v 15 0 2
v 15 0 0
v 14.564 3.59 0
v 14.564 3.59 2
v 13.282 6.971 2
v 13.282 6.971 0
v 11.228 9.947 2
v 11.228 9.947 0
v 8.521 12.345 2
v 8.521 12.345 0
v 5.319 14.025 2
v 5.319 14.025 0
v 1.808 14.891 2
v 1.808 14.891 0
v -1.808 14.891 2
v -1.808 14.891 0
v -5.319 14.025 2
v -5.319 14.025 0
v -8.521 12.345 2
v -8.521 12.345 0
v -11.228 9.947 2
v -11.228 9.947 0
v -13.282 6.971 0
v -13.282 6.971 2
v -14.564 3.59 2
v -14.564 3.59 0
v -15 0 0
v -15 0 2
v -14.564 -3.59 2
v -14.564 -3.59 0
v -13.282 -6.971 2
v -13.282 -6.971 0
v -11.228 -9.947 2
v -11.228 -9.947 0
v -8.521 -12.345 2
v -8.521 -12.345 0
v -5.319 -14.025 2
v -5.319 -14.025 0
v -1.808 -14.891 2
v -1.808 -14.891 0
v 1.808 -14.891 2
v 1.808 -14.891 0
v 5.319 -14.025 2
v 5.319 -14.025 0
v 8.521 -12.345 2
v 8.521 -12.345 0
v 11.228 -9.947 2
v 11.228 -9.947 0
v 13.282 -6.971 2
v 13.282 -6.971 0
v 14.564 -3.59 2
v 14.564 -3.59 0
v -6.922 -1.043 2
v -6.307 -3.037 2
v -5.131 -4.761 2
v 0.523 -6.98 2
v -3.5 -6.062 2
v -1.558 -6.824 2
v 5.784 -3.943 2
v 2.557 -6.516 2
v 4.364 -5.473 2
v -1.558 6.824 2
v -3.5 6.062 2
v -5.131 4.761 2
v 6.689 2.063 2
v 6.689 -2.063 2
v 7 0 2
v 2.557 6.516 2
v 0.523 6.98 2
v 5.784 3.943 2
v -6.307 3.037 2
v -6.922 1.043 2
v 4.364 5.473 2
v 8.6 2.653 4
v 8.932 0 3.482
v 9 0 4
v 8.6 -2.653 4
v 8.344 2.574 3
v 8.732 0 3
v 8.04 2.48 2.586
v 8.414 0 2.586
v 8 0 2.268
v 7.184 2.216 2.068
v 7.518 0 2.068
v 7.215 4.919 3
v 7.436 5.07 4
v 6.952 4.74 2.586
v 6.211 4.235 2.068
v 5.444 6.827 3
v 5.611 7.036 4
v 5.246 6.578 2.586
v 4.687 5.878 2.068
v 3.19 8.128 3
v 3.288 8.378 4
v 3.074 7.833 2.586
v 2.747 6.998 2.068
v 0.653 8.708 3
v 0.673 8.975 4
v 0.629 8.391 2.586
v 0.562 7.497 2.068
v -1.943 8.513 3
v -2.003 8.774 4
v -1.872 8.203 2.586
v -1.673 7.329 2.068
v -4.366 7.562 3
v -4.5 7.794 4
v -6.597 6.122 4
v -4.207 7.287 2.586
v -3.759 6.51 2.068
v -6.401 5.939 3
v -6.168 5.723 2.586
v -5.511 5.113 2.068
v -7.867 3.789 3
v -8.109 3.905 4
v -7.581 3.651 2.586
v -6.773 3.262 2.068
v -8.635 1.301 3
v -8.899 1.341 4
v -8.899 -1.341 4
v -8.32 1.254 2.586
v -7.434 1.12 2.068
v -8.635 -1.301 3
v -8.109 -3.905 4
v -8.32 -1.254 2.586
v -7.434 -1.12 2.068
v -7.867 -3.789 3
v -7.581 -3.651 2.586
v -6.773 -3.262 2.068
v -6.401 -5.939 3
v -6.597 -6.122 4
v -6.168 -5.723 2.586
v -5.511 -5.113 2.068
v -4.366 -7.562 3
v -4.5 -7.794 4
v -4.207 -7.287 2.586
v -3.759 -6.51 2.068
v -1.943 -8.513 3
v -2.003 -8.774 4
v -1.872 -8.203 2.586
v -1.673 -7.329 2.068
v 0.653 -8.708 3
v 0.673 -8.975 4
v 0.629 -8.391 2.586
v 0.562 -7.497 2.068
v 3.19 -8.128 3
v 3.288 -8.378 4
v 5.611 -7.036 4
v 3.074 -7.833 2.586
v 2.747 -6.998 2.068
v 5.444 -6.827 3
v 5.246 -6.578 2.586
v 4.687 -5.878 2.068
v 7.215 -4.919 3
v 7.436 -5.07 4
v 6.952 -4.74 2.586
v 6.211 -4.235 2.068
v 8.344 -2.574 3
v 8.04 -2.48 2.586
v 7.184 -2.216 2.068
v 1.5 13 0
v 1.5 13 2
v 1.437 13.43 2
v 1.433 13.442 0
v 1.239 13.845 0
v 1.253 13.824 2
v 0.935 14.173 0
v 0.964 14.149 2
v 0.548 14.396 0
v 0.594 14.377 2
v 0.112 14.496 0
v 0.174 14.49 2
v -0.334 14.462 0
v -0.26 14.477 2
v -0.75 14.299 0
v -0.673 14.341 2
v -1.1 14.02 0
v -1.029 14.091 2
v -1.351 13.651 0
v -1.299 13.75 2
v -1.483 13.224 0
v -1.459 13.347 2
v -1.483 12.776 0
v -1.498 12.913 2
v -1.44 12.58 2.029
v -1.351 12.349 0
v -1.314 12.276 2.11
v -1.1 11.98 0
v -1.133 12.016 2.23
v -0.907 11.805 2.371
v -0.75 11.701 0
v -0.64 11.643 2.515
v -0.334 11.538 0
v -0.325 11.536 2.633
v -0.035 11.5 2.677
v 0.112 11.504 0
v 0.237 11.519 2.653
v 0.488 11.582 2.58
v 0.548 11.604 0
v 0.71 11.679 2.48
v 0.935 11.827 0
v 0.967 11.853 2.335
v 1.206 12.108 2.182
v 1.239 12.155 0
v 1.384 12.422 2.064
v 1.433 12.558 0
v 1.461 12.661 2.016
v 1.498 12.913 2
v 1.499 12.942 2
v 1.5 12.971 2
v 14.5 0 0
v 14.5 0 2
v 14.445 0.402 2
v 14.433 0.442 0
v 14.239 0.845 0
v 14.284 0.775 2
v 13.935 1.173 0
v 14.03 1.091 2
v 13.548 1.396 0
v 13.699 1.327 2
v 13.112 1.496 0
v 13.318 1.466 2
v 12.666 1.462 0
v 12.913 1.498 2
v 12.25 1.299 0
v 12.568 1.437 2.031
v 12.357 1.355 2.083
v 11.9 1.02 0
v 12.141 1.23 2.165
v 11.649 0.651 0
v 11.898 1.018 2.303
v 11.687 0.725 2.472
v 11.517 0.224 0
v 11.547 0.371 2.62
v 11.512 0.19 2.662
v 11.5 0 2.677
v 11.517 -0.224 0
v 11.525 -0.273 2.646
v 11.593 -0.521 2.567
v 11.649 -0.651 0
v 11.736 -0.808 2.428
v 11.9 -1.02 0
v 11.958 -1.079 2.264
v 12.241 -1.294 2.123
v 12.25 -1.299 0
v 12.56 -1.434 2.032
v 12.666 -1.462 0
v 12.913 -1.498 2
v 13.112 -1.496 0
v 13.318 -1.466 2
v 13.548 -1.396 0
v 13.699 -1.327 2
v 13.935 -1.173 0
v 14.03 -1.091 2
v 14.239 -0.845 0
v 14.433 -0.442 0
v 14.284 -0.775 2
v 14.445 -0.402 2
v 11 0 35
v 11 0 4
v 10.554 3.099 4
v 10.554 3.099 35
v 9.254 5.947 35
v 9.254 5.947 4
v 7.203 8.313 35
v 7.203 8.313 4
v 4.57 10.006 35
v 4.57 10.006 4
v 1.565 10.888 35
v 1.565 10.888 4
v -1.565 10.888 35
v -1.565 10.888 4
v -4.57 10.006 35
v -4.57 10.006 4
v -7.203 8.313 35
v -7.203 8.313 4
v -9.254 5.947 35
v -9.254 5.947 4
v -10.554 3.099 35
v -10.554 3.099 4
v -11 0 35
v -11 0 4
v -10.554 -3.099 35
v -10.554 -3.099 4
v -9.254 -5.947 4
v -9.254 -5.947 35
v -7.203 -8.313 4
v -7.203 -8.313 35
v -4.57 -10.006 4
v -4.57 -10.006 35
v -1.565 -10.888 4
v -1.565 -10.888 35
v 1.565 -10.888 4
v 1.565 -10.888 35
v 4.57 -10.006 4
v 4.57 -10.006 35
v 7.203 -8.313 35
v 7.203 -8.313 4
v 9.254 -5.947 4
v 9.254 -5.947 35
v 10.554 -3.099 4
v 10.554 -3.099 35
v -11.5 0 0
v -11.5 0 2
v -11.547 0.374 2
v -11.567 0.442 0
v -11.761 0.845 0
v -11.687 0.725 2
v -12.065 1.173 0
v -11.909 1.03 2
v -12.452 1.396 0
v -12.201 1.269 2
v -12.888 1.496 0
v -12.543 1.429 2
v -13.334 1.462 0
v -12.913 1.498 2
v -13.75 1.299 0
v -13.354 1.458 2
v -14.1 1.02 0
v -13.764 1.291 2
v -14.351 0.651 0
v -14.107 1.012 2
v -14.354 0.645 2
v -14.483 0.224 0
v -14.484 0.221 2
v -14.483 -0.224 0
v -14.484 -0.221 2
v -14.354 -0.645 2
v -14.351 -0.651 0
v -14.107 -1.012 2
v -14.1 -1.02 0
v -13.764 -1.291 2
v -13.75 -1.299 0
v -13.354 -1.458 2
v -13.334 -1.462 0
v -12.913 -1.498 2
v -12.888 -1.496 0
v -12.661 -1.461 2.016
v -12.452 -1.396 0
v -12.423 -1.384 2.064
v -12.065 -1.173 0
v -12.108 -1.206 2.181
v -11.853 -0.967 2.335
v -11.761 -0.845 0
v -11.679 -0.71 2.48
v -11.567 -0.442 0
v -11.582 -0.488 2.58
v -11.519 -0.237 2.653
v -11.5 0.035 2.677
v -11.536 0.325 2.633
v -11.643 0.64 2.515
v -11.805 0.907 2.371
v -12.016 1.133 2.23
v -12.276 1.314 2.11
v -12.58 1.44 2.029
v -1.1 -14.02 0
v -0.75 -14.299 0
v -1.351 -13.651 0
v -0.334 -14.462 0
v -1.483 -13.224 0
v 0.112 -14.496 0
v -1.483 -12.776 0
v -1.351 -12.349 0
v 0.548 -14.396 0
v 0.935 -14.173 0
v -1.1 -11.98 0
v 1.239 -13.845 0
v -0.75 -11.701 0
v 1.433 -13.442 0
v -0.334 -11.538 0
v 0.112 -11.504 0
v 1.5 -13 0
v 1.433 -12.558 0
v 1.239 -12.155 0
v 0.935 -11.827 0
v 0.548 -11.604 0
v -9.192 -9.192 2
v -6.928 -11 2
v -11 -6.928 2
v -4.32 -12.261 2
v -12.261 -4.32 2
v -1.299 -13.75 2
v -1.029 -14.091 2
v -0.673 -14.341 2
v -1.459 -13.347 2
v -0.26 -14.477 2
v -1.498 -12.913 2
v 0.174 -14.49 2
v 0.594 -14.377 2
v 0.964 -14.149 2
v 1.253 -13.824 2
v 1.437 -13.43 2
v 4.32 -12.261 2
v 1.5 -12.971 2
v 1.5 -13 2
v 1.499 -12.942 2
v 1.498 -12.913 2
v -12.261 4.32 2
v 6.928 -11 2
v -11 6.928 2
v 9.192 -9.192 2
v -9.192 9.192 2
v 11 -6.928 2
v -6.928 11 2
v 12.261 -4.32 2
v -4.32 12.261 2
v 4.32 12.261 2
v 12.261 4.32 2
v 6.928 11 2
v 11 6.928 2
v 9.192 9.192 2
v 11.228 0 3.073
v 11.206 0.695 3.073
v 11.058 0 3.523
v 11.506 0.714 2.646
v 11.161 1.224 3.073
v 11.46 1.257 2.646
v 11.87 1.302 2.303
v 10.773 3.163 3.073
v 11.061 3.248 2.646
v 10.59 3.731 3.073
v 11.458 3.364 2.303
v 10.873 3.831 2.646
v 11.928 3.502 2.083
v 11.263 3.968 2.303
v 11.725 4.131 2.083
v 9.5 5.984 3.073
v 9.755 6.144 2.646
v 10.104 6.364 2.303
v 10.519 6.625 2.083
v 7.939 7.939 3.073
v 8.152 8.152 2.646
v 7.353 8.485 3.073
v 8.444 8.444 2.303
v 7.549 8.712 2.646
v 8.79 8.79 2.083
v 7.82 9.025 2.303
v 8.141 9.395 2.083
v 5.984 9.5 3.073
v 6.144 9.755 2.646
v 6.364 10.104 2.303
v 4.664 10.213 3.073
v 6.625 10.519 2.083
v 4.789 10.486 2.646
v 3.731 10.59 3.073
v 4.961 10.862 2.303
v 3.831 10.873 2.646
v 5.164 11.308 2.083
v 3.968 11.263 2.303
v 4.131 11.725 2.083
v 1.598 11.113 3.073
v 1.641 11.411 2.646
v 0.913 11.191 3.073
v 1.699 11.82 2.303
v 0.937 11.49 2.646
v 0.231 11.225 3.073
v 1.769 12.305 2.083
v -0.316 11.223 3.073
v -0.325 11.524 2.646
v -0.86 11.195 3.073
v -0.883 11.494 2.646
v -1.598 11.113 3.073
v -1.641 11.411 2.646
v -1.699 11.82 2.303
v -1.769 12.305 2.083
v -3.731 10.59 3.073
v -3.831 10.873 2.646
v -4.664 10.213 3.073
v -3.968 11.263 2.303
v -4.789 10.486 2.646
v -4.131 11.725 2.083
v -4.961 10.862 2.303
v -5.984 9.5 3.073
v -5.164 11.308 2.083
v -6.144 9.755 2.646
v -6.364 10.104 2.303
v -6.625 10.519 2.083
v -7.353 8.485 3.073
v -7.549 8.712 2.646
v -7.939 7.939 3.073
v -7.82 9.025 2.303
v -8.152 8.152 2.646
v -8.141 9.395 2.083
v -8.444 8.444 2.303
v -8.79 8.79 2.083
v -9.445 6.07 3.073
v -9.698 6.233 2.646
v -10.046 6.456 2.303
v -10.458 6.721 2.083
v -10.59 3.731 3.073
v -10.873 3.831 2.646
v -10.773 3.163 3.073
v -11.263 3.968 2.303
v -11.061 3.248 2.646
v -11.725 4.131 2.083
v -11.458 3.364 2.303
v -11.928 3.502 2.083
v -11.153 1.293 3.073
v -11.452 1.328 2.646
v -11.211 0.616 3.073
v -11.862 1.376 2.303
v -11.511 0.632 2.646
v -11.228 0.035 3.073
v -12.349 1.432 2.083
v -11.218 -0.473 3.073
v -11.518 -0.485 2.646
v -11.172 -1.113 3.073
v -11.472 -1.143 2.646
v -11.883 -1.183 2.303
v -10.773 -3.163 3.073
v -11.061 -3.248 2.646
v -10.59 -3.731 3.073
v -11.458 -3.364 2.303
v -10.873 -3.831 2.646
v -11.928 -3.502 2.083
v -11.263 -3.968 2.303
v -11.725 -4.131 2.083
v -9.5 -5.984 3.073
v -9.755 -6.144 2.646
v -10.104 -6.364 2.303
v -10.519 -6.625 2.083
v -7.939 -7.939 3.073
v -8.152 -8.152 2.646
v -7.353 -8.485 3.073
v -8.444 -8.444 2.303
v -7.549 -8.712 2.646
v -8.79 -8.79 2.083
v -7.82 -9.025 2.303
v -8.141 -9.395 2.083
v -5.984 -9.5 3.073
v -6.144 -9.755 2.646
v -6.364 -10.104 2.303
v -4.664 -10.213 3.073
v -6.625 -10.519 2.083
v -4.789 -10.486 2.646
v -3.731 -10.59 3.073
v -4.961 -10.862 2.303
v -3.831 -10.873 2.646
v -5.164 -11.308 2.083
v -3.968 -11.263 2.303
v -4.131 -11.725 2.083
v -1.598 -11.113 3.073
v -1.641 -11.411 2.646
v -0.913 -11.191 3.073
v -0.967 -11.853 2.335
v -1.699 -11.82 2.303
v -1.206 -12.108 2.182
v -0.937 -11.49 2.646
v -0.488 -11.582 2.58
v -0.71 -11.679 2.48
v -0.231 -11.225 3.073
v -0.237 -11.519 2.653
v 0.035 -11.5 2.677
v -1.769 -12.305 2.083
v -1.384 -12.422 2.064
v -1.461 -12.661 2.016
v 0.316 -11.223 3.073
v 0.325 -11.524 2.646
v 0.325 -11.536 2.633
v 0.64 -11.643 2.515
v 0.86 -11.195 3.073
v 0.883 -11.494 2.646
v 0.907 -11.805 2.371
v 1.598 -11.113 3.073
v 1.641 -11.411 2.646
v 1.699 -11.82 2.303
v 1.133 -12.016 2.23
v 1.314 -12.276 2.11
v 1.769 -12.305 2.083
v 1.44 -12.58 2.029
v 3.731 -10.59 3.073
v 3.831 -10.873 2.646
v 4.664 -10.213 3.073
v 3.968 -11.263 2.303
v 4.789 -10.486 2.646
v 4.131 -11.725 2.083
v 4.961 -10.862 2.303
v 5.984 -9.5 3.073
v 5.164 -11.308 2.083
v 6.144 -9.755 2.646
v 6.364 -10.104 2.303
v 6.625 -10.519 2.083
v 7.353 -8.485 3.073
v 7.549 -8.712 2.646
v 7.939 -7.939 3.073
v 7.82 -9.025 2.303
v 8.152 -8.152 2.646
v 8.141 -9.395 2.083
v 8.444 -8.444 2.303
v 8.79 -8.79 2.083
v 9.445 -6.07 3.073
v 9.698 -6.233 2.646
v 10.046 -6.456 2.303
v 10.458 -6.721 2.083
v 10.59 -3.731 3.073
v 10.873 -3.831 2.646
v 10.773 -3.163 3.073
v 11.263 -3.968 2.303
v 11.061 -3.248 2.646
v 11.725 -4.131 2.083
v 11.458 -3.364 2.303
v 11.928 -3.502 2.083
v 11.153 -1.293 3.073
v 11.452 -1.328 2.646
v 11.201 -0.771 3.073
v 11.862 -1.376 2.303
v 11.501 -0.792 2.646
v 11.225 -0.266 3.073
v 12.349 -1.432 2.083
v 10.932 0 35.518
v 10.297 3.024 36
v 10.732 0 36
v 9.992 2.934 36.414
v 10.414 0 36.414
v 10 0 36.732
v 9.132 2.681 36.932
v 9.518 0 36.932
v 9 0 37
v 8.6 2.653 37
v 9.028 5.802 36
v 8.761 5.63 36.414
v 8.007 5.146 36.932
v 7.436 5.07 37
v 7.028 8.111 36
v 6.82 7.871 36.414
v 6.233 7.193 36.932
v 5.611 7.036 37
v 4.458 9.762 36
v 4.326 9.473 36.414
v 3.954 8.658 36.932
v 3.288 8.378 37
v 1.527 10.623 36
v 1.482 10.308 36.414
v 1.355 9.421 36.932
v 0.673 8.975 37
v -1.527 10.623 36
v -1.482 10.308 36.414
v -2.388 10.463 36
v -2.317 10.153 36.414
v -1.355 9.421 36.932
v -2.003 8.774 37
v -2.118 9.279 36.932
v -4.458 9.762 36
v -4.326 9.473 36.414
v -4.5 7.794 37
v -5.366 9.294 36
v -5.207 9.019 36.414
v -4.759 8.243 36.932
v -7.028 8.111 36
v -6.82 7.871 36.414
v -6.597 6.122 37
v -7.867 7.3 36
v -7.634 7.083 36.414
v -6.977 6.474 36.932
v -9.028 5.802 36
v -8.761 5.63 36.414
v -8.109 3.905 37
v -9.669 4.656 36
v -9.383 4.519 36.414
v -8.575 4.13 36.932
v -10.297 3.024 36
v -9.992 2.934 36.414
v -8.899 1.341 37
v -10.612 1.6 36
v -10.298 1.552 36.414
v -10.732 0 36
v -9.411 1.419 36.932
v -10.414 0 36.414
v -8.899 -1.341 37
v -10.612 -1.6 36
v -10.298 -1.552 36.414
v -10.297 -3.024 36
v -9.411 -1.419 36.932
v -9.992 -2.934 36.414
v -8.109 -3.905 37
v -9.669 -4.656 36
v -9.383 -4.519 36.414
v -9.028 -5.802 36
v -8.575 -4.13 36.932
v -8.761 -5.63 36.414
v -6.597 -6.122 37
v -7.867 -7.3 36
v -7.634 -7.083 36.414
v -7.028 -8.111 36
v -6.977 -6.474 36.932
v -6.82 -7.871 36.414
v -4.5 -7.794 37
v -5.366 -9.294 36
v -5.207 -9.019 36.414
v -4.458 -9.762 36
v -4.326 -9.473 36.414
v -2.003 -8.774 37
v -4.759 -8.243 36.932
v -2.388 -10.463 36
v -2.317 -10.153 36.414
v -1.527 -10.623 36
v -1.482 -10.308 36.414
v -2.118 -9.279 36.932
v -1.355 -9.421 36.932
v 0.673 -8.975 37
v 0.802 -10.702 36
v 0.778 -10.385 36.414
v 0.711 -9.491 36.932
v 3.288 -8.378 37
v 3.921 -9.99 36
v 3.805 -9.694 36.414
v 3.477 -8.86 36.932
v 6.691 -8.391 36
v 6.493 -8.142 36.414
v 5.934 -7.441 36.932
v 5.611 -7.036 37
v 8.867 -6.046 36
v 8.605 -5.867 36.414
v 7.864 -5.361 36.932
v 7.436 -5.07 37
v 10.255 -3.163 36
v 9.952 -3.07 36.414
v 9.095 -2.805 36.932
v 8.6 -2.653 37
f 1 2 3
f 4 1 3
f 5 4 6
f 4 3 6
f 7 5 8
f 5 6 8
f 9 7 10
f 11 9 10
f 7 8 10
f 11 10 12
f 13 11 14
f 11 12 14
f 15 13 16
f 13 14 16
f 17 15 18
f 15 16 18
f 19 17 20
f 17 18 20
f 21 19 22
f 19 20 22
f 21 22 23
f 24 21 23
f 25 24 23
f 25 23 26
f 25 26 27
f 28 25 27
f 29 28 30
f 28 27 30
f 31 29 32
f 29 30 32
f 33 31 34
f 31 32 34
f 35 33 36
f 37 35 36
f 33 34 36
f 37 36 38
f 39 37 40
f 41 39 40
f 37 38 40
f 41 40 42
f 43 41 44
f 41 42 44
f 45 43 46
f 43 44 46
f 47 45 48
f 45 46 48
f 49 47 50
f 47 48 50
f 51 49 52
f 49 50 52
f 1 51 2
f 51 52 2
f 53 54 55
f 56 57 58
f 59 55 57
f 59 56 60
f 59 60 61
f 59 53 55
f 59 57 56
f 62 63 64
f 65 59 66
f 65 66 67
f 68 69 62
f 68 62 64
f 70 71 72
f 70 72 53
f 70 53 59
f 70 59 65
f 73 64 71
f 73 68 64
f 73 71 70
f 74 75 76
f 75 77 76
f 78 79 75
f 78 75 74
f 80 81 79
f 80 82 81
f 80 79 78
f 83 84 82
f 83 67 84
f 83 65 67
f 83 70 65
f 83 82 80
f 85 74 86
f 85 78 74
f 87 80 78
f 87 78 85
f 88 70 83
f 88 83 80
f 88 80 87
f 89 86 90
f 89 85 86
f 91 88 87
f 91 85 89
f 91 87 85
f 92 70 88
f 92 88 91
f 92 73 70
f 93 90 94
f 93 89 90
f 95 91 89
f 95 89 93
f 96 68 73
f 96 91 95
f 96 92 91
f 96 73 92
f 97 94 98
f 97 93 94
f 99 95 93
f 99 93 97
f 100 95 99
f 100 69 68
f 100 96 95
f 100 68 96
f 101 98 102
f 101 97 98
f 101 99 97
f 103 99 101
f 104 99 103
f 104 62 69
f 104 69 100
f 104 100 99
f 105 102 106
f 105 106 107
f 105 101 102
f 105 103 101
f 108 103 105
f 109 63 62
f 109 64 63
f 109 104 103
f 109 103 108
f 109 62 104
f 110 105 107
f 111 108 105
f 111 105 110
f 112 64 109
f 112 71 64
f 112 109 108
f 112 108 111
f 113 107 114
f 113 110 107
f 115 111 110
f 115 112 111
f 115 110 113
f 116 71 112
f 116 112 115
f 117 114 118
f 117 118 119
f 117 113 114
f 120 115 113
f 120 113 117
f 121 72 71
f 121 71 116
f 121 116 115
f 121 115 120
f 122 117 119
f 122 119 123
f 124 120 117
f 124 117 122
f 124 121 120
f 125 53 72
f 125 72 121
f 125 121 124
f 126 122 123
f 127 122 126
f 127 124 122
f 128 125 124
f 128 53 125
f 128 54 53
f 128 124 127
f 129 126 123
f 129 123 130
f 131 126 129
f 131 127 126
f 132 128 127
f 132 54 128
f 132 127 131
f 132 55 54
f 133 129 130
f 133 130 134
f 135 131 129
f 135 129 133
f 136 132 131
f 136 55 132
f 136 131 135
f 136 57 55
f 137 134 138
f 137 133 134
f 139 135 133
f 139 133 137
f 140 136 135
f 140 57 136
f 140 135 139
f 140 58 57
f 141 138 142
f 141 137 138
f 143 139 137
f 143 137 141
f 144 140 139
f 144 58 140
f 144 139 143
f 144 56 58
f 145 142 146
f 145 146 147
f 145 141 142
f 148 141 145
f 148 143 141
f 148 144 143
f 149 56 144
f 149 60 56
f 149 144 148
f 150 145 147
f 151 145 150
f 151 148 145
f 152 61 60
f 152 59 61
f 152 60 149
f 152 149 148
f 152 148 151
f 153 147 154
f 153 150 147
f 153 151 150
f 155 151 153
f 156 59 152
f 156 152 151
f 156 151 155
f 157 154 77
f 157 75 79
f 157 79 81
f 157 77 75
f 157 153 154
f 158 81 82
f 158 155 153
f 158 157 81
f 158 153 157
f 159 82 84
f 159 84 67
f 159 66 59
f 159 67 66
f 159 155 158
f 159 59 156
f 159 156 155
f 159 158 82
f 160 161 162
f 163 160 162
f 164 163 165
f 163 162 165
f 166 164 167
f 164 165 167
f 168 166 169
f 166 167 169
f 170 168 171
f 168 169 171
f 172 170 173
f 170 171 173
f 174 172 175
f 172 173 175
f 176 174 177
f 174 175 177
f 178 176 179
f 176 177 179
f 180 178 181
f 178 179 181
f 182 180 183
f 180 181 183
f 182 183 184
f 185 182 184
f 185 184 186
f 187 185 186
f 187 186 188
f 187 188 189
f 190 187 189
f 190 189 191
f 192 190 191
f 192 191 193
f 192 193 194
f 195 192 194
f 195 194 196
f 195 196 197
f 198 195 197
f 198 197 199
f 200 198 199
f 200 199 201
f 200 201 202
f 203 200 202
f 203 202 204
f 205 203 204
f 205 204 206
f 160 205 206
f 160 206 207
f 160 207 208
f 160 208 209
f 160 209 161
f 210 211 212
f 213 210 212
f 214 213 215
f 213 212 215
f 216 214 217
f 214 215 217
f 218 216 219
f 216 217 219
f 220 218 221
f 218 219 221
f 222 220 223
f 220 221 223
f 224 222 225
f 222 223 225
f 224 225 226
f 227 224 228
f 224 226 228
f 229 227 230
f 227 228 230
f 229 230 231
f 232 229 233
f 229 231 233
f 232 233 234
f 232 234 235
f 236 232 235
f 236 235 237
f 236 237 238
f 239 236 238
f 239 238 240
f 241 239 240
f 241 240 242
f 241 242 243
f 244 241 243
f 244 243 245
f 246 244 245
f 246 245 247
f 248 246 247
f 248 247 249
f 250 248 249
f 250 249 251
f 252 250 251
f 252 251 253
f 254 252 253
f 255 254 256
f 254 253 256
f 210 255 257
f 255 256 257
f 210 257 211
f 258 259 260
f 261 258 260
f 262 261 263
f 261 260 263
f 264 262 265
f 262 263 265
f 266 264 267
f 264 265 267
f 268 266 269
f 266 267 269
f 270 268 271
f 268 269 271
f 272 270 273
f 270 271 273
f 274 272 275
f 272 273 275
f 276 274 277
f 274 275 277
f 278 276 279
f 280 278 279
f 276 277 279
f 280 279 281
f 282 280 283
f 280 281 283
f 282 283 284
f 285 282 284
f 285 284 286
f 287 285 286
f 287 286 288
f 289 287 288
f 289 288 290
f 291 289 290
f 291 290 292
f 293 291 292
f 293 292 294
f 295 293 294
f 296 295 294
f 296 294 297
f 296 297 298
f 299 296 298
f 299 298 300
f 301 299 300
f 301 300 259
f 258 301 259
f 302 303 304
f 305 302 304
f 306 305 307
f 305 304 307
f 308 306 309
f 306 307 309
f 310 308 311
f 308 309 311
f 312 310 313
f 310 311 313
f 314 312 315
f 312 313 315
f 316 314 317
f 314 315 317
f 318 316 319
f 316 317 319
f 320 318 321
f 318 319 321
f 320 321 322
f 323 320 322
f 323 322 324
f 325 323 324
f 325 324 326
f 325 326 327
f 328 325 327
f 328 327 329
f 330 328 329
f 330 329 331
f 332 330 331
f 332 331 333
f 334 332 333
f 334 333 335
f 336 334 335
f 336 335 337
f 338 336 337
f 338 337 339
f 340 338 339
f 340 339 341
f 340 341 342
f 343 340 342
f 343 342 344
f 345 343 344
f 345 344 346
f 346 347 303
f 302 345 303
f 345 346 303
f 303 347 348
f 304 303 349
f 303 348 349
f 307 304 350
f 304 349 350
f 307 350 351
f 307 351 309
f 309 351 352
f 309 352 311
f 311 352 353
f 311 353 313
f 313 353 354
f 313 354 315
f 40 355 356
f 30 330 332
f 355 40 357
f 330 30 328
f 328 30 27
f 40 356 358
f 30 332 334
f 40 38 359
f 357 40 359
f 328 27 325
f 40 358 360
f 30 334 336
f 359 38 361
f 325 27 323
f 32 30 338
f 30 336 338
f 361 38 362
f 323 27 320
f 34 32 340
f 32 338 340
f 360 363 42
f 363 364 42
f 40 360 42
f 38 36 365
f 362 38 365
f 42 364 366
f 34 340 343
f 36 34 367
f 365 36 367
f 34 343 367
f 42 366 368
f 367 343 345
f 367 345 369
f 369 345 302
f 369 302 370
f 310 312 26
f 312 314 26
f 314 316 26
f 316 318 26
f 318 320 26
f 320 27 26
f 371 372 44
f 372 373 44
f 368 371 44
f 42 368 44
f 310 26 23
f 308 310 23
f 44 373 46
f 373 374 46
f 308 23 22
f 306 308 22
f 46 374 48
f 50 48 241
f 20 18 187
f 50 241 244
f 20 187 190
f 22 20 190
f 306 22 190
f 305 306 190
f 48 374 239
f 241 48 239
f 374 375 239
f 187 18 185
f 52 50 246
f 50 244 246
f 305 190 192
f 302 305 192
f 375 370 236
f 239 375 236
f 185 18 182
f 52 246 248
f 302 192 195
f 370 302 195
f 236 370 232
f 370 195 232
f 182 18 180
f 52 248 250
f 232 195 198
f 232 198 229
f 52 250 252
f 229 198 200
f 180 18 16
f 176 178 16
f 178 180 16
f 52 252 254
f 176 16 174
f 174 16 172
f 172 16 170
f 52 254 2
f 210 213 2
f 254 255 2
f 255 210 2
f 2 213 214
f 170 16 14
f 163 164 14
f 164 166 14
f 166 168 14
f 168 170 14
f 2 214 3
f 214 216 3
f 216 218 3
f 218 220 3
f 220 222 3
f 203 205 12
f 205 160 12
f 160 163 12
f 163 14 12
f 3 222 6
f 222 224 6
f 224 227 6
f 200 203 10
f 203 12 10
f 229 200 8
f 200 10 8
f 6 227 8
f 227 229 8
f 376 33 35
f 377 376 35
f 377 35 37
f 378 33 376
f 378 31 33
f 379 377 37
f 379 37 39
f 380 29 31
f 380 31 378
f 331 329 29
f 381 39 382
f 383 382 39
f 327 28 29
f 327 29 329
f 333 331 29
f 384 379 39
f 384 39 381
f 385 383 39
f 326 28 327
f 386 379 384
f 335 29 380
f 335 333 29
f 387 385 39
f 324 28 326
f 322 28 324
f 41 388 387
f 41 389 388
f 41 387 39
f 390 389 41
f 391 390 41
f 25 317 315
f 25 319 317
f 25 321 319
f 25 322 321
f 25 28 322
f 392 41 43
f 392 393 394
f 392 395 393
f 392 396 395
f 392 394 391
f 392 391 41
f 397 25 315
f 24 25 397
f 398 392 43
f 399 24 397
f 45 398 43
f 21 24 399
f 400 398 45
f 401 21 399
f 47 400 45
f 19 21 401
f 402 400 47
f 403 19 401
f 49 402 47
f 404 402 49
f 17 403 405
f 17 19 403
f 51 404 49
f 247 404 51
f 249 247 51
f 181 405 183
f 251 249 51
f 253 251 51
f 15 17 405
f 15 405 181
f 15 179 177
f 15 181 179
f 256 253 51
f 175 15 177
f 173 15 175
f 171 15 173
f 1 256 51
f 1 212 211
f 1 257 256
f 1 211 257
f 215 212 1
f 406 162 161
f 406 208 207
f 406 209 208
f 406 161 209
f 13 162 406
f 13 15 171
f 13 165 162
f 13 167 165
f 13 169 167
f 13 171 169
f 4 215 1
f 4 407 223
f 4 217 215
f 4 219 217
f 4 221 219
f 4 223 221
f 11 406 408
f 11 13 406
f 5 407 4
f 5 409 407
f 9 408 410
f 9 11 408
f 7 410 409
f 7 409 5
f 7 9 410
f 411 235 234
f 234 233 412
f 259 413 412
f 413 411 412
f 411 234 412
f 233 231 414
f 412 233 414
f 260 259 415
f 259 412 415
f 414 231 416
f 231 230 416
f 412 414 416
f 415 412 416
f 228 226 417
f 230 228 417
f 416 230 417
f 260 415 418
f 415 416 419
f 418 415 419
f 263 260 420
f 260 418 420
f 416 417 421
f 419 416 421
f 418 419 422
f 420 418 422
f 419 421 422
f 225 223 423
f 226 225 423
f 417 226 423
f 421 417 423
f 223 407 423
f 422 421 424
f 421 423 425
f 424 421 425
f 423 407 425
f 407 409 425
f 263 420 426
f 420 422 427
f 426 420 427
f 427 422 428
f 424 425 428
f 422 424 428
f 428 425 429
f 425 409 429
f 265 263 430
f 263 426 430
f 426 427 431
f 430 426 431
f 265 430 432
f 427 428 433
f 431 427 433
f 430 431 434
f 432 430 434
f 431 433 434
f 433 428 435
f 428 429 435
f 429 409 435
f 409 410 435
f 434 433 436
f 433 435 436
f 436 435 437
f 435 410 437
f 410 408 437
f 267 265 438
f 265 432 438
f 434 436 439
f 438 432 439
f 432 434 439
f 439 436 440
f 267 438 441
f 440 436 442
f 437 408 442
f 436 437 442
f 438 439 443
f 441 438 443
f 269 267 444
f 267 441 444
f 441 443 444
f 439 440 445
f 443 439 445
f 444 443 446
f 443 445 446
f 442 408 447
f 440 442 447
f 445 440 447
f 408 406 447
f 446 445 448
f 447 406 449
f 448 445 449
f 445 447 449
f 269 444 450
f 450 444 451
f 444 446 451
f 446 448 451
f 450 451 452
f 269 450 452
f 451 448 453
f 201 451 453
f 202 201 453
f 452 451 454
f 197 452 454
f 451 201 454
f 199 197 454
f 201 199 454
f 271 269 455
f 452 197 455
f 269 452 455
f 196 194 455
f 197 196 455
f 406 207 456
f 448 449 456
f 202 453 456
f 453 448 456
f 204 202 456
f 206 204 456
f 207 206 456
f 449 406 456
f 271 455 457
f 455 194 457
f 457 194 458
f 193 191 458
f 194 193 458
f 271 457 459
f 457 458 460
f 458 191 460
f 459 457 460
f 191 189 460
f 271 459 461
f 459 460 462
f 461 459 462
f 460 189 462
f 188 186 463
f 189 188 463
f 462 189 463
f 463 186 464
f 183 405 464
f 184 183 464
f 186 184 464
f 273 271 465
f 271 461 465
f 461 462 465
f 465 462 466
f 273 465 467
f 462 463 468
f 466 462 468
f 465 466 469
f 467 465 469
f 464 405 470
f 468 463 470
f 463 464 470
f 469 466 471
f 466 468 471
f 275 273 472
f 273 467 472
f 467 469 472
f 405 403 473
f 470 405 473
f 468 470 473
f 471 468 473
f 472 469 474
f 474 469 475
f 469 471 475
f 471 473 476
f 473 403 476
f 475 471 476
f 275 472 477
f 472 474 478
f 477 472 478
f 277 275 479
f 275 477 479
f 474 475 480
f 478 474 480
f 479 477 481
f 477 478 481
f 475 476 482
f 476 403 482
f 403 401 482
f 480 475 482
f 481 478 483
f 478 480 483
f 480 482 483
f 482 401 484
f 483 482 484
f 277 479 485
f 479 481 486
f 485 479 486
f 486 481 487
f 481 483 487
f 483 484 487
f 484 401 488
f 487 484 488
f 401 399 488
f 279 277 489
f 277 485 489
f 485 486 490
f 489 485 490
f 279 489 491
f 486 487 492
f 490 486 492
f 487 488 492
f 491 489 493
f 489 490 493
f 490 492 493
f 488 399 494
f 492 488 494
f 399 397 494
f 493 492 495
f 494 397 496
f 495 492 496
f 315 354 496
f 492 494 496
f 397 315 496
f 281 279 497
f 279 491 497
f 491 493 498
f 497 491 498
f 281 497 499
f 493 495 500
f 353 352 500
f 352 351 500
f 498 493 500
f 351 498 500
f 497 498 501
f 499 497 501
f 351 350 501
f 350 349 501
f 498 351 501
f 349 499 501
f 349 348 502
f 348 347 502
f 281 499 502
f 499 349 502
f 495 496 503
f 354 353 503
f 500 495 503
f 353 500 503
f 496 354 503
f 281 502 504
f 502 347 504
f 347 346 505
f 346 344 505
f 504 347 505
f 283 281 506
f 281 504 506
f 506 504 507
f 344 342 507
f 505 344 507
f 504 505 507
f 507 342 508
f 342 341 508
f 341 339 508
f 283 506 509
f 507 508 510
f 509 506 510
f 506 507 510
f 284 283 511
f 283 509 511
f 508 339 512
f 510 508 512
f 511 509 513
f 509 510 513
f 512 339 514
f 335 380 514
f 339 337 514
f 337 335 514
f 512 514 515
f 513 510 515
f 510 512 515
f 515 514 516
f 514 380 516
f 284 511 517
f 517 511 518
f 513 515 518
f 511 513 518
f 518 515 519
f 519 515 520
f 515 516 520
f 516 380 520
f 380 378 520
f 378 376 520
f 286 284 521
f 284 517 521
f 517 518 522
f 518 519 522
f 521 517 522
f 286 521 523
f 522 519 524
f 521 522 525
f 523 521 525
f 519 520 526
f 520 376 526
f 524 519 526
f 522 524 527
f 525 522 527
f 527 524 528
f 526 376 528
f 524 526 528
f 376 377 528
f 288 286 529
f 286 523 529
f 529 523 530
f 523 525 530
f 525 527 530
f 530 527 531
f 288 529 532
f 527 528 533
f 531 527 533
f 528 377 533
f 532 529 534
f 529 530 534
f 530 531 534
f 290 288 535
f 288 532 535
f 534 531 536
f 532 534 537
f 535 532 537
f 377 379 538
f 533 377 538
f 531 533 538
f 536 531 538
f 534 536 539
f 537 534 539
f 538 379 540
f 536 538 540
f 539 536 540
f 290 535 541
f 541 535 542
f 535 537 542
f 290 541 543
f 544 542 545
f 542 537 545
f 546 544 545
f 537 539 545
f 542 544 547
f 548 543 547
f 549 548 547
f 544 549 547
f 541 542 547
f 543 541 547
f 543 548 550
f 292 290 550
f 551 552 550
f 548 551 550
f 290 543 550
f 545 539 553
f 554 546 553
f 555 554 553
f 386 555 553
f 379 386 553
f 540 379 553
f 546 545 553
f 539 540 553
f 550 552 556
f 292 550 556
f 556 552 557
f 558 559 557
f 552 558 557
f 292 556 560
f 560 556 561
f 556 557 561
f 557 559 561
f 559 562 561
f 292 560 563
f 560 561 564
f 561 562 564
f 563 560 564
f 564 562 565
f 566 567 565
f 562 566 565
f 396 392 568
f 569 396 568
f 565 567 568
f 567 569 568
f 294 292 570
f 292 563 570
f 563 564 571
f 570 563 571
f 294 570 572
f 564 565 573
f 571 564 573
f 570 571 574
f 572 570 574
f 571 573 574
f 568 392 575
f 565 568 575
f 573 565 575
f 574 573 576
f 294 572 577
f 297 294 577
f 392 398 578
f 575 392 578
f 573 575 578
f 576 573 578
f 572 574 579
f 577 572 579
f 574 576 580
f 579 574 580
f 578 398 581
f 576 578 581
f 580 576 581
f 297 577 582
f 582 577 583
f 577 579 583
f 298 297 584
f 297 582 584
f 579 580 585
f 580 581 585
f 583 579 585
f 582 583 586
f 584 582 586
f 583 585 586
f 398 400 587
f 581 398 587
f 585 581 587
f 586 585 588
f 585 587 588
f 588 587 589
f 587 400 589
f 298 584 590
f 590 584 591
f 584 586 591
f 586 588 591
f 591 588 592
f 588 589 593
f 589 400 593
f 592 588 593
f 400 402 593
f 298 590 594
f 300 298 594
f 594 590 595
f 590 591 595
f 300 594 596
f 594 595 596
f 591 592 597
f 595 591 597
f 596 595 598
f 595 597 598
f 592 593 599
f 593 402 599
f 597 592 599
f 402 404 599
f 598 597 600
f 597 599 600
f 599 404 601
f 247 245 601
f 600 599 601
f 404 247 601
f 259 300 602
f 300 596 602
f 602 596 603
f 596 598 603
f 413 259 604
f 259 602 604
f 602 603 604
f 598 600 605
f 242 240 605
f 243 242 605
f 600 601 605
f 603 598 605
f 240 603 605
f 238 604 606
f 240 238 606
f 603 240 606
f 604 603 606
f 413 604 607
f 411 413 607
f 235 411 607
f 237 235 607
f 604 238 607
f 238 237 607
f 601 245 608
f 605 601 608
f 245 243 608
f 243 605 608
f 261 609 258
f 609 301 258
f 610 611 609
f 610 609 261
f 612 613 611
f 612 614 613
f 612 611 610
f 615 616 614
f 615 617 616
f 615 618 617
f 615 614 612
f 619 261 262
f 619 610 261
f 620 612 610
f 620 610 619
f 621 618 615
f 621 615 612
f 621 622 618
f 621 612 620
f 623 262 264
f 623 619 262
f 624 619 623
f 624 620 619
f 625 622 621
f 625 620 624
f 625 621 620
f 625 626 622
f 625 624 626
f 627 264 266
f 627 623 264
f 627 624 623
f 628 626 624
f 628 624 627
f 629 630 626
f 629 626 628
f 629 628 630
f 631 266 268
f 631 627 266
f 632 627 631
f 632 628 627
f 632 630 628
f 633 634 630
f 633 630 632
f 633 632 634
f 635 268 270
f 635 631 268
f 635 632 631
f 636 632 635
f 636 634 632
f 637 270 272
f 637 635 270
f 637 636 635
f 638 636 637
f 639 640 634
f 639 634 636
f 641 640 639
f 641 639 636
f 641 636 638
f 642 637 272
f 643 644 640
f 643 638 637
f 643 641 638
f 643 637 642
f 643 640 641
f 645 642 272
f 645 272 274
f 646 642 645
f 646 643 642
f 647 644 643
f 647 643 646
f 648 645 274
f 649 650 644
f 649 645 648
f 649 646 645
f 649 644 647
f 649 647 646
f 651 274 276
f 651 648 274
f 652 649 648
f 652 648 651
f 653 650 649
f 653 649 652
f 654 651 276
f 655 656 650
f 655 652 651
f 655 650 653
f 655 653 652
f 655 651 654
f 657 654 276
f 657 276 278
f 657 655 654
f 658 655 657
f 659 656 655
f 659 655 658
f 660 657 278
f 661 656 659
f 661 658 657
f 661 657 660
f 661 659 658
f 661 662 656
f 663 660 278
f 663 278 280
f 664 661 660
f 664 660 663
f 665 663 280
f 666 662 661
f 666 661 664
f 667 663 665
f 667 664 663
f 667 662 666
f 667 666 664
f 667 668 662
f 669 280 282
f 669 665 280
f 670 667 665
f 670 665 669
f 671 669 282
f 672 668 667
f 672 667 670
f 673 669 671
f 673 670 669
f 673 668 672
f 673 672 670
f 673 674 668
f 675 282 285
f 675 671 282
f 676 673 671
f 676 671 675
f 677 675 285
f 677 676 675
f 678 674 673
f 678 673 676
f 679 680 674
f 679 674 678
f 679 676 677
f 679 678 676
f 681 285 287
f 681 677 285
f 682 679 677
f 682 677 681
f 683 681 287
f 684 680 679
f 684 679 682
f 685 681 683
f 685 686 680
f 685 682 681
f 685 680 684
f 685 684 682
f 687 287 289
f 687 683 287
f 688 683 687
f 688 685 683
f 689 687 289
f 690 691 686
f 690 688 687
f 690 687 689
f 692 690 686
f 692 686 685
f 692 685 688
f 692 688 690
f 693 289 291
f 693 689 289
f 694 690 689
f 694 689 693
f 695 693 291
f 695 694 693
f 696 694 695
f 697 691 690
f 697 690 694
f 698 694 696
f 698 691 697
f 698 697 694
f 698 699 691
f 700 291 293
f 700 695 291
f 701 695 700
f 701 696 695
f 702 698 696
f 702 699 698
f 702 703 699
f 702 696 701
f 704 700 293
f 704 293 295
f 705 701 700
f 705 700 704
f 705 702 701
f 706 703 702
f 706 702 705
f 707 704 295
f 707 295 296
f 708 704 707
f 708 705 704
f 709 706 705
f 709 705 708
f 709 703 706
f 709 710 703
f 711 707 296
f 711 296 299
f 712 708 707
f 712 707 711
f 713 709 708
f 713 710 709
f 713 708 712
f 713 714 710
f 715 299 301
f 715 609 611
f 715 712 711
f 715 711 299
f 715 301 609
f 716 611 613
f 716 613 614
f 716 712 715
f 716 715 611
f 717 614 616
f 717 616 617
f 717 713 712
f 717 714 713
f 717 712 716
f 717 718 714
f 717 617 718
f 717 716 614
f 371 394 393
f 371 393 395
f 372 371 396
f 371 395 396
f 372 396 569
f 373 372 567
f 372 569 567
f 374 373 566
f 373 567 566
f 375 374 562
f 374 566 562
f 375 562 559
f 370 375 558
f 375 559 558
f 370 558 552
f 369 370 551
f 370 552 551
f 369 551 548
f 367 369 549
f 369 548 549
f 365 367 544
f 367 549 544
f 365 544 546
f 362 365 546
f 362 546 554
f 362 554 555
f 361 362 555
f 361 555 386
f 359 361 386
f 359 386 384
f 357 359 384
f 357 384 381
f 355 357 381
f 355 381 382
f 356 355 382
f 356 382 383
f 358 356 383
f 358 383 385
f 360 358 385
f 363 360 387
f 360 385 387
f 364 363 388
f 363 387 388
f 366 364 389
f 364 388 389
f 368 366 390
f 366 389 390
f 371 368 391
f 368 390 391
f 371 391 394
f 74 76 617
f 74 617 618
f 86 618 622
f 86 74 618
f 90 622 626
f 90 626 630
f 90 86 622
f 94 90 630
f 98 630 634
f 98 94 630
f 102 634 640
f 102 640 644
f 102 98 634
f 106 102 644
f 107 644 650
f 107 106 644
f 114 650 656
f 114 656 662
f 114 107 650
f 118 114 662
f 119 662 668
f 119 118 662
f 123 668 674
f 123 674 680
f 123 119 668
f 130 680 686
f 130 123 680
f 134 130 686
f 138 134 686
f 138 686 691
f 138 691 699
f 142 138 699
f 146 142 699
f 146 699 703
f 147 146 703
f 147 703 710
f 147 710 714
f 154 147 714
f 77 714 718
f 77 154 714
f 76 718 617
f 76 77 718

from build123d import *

# Parameters (mm, degrees)
SKETCH1_R           = 15
BOSS_EXTRUDE1_DEPTH = 2
SKETCH2_R           = 11
SKETCH2_R_2         = 9
BOSS_EXTRUDE2_DEPTH = 35
SKETCH3_R           = 1.5
CUT_EXTRUDE1_DEPTH  = 41.926763859
FILLET1_R           = 2
FILLET2_R           = 2


with BuildPart() as part:
    # Sketch1 → Boss-Extrude1 (new body)
    with BuildSketch(Plane.XY):
        Circle(SKETCH1_R)
    extrude(amount=BOSS_EXTRUDE1_DEPTH)

    # Sketch2 → Boss-Extrude2 (add)
    with BuildSketch(Plane.XY.offset(2)):
        Circle(SKETCH2_R)
        Circle(SKETCH2_R_2, mode=Mode.SUBTRACT)
    extrude(amount=BOSS_EXTRUDE2_DEPTH)

    # Sketch3 → Cut-Extrude1 (cut, through all)
    with BuildSketch(Plane.XY.offset(2)):
        with Locations((0, 13)):
            Circle(SKETCH3_R)
        with Locations((13, 0)):
            Circle(SKETCH3_R)
        with Locations((0, -13)):
            Circle(SKETCH3_R)
        with Locations((-13, 0)):
            Circle(SKETCH3_R)
    extrude(amount=-CUT_EXTRUDE1_DEPTH, mode=Mode.SUBTRACT)

    # Fillet1
    # the kernel refuses this fillet: 2 mm, written as the material it adds along each edge
    with BuildSketch(Plane(origin=(0, 0, 2), x_dir=(1, 0, 0), z_dir=(0, -1, 0))) as fillet1_piece_1_section:
        with BuildLine():
            CenterArc((11 + FILLET1_R, FILLET1_R), FILLET1_R, 180, 90)
            Line((11, FILLET1_R), (11, 0))
            Line((11, 0), (11 + FILLET1_R, 0))
        make_face()
    fillet1_piece_1 = revolve(axis=Axis((0, 0, 2), (0, 0, 1)), mode=Mode.PRIVATE)
    fillet1_piece_1 = fillet1_piece_1 - Plane(origin=(-13, 0, 2.02819371), x_dir=(1, 0, 0), z_dir=(0, 0, 1)) * Cylinder(1.5, 52, mode=Mode.PRIVATE)
    fillet1_piece_1 = fillet1_piece_1 - Plane(origin=(0, -13, 2.02819371), x_dir=(1, 0, 0), z_dir=(0, 0, 1)) * Cylinder(1.5, 52, mode=Mode.PRIVATE)
    fillet1_piece_1 = fillet1_piece_1 - Plane(origin=(13, 0, 2.02819371), x_dir=(1, 0, 0), z_dir=(0, 0, 1)) * Cylinder(1.5, 52, mode=Mode.PRIVATE)
    fillet1_piece_1 = fillet1_piece_1 - Plane(origin=(0, 13, 2.02819371), x_dir=(1, 0, 0), z_dir=(0, 0, 1)) * Cylinder(1.5, 52, mode=Mode.PRIVATE)
    add(fillet1_piece_1)
    # the kernel refuses this fillet: 2 mm, written as the material it takes off along each edge
    with BuildSketch(Plane(origin=(0, 0, 37), x_dir=(1, 0, 0), z_dir=(0, -1, 0))) as fillet1_2_piece_1:
        with BuildLine():
            CenterArc((11 - FILLET1_R, -FILLET1_R), FILLET1_R, 0, 90)
            Line((11 - FILLET1_R, 0), (11, 0))
            Line((11, 0), (11, -FILLET1_R))
        make_face()
    revolve(axis=Axis((0, 0, 37), (0, 0, 1)), mode=Mode.SUBTRACT)

    # Fillet2
    fillet2_edges = [part.edges().sort_by_distance(p)[0] for p in [
        (-9, 0, 2),
    ]]
    fillet(fillet2_edges, radius=FILLET2_R)


solid = part.part
